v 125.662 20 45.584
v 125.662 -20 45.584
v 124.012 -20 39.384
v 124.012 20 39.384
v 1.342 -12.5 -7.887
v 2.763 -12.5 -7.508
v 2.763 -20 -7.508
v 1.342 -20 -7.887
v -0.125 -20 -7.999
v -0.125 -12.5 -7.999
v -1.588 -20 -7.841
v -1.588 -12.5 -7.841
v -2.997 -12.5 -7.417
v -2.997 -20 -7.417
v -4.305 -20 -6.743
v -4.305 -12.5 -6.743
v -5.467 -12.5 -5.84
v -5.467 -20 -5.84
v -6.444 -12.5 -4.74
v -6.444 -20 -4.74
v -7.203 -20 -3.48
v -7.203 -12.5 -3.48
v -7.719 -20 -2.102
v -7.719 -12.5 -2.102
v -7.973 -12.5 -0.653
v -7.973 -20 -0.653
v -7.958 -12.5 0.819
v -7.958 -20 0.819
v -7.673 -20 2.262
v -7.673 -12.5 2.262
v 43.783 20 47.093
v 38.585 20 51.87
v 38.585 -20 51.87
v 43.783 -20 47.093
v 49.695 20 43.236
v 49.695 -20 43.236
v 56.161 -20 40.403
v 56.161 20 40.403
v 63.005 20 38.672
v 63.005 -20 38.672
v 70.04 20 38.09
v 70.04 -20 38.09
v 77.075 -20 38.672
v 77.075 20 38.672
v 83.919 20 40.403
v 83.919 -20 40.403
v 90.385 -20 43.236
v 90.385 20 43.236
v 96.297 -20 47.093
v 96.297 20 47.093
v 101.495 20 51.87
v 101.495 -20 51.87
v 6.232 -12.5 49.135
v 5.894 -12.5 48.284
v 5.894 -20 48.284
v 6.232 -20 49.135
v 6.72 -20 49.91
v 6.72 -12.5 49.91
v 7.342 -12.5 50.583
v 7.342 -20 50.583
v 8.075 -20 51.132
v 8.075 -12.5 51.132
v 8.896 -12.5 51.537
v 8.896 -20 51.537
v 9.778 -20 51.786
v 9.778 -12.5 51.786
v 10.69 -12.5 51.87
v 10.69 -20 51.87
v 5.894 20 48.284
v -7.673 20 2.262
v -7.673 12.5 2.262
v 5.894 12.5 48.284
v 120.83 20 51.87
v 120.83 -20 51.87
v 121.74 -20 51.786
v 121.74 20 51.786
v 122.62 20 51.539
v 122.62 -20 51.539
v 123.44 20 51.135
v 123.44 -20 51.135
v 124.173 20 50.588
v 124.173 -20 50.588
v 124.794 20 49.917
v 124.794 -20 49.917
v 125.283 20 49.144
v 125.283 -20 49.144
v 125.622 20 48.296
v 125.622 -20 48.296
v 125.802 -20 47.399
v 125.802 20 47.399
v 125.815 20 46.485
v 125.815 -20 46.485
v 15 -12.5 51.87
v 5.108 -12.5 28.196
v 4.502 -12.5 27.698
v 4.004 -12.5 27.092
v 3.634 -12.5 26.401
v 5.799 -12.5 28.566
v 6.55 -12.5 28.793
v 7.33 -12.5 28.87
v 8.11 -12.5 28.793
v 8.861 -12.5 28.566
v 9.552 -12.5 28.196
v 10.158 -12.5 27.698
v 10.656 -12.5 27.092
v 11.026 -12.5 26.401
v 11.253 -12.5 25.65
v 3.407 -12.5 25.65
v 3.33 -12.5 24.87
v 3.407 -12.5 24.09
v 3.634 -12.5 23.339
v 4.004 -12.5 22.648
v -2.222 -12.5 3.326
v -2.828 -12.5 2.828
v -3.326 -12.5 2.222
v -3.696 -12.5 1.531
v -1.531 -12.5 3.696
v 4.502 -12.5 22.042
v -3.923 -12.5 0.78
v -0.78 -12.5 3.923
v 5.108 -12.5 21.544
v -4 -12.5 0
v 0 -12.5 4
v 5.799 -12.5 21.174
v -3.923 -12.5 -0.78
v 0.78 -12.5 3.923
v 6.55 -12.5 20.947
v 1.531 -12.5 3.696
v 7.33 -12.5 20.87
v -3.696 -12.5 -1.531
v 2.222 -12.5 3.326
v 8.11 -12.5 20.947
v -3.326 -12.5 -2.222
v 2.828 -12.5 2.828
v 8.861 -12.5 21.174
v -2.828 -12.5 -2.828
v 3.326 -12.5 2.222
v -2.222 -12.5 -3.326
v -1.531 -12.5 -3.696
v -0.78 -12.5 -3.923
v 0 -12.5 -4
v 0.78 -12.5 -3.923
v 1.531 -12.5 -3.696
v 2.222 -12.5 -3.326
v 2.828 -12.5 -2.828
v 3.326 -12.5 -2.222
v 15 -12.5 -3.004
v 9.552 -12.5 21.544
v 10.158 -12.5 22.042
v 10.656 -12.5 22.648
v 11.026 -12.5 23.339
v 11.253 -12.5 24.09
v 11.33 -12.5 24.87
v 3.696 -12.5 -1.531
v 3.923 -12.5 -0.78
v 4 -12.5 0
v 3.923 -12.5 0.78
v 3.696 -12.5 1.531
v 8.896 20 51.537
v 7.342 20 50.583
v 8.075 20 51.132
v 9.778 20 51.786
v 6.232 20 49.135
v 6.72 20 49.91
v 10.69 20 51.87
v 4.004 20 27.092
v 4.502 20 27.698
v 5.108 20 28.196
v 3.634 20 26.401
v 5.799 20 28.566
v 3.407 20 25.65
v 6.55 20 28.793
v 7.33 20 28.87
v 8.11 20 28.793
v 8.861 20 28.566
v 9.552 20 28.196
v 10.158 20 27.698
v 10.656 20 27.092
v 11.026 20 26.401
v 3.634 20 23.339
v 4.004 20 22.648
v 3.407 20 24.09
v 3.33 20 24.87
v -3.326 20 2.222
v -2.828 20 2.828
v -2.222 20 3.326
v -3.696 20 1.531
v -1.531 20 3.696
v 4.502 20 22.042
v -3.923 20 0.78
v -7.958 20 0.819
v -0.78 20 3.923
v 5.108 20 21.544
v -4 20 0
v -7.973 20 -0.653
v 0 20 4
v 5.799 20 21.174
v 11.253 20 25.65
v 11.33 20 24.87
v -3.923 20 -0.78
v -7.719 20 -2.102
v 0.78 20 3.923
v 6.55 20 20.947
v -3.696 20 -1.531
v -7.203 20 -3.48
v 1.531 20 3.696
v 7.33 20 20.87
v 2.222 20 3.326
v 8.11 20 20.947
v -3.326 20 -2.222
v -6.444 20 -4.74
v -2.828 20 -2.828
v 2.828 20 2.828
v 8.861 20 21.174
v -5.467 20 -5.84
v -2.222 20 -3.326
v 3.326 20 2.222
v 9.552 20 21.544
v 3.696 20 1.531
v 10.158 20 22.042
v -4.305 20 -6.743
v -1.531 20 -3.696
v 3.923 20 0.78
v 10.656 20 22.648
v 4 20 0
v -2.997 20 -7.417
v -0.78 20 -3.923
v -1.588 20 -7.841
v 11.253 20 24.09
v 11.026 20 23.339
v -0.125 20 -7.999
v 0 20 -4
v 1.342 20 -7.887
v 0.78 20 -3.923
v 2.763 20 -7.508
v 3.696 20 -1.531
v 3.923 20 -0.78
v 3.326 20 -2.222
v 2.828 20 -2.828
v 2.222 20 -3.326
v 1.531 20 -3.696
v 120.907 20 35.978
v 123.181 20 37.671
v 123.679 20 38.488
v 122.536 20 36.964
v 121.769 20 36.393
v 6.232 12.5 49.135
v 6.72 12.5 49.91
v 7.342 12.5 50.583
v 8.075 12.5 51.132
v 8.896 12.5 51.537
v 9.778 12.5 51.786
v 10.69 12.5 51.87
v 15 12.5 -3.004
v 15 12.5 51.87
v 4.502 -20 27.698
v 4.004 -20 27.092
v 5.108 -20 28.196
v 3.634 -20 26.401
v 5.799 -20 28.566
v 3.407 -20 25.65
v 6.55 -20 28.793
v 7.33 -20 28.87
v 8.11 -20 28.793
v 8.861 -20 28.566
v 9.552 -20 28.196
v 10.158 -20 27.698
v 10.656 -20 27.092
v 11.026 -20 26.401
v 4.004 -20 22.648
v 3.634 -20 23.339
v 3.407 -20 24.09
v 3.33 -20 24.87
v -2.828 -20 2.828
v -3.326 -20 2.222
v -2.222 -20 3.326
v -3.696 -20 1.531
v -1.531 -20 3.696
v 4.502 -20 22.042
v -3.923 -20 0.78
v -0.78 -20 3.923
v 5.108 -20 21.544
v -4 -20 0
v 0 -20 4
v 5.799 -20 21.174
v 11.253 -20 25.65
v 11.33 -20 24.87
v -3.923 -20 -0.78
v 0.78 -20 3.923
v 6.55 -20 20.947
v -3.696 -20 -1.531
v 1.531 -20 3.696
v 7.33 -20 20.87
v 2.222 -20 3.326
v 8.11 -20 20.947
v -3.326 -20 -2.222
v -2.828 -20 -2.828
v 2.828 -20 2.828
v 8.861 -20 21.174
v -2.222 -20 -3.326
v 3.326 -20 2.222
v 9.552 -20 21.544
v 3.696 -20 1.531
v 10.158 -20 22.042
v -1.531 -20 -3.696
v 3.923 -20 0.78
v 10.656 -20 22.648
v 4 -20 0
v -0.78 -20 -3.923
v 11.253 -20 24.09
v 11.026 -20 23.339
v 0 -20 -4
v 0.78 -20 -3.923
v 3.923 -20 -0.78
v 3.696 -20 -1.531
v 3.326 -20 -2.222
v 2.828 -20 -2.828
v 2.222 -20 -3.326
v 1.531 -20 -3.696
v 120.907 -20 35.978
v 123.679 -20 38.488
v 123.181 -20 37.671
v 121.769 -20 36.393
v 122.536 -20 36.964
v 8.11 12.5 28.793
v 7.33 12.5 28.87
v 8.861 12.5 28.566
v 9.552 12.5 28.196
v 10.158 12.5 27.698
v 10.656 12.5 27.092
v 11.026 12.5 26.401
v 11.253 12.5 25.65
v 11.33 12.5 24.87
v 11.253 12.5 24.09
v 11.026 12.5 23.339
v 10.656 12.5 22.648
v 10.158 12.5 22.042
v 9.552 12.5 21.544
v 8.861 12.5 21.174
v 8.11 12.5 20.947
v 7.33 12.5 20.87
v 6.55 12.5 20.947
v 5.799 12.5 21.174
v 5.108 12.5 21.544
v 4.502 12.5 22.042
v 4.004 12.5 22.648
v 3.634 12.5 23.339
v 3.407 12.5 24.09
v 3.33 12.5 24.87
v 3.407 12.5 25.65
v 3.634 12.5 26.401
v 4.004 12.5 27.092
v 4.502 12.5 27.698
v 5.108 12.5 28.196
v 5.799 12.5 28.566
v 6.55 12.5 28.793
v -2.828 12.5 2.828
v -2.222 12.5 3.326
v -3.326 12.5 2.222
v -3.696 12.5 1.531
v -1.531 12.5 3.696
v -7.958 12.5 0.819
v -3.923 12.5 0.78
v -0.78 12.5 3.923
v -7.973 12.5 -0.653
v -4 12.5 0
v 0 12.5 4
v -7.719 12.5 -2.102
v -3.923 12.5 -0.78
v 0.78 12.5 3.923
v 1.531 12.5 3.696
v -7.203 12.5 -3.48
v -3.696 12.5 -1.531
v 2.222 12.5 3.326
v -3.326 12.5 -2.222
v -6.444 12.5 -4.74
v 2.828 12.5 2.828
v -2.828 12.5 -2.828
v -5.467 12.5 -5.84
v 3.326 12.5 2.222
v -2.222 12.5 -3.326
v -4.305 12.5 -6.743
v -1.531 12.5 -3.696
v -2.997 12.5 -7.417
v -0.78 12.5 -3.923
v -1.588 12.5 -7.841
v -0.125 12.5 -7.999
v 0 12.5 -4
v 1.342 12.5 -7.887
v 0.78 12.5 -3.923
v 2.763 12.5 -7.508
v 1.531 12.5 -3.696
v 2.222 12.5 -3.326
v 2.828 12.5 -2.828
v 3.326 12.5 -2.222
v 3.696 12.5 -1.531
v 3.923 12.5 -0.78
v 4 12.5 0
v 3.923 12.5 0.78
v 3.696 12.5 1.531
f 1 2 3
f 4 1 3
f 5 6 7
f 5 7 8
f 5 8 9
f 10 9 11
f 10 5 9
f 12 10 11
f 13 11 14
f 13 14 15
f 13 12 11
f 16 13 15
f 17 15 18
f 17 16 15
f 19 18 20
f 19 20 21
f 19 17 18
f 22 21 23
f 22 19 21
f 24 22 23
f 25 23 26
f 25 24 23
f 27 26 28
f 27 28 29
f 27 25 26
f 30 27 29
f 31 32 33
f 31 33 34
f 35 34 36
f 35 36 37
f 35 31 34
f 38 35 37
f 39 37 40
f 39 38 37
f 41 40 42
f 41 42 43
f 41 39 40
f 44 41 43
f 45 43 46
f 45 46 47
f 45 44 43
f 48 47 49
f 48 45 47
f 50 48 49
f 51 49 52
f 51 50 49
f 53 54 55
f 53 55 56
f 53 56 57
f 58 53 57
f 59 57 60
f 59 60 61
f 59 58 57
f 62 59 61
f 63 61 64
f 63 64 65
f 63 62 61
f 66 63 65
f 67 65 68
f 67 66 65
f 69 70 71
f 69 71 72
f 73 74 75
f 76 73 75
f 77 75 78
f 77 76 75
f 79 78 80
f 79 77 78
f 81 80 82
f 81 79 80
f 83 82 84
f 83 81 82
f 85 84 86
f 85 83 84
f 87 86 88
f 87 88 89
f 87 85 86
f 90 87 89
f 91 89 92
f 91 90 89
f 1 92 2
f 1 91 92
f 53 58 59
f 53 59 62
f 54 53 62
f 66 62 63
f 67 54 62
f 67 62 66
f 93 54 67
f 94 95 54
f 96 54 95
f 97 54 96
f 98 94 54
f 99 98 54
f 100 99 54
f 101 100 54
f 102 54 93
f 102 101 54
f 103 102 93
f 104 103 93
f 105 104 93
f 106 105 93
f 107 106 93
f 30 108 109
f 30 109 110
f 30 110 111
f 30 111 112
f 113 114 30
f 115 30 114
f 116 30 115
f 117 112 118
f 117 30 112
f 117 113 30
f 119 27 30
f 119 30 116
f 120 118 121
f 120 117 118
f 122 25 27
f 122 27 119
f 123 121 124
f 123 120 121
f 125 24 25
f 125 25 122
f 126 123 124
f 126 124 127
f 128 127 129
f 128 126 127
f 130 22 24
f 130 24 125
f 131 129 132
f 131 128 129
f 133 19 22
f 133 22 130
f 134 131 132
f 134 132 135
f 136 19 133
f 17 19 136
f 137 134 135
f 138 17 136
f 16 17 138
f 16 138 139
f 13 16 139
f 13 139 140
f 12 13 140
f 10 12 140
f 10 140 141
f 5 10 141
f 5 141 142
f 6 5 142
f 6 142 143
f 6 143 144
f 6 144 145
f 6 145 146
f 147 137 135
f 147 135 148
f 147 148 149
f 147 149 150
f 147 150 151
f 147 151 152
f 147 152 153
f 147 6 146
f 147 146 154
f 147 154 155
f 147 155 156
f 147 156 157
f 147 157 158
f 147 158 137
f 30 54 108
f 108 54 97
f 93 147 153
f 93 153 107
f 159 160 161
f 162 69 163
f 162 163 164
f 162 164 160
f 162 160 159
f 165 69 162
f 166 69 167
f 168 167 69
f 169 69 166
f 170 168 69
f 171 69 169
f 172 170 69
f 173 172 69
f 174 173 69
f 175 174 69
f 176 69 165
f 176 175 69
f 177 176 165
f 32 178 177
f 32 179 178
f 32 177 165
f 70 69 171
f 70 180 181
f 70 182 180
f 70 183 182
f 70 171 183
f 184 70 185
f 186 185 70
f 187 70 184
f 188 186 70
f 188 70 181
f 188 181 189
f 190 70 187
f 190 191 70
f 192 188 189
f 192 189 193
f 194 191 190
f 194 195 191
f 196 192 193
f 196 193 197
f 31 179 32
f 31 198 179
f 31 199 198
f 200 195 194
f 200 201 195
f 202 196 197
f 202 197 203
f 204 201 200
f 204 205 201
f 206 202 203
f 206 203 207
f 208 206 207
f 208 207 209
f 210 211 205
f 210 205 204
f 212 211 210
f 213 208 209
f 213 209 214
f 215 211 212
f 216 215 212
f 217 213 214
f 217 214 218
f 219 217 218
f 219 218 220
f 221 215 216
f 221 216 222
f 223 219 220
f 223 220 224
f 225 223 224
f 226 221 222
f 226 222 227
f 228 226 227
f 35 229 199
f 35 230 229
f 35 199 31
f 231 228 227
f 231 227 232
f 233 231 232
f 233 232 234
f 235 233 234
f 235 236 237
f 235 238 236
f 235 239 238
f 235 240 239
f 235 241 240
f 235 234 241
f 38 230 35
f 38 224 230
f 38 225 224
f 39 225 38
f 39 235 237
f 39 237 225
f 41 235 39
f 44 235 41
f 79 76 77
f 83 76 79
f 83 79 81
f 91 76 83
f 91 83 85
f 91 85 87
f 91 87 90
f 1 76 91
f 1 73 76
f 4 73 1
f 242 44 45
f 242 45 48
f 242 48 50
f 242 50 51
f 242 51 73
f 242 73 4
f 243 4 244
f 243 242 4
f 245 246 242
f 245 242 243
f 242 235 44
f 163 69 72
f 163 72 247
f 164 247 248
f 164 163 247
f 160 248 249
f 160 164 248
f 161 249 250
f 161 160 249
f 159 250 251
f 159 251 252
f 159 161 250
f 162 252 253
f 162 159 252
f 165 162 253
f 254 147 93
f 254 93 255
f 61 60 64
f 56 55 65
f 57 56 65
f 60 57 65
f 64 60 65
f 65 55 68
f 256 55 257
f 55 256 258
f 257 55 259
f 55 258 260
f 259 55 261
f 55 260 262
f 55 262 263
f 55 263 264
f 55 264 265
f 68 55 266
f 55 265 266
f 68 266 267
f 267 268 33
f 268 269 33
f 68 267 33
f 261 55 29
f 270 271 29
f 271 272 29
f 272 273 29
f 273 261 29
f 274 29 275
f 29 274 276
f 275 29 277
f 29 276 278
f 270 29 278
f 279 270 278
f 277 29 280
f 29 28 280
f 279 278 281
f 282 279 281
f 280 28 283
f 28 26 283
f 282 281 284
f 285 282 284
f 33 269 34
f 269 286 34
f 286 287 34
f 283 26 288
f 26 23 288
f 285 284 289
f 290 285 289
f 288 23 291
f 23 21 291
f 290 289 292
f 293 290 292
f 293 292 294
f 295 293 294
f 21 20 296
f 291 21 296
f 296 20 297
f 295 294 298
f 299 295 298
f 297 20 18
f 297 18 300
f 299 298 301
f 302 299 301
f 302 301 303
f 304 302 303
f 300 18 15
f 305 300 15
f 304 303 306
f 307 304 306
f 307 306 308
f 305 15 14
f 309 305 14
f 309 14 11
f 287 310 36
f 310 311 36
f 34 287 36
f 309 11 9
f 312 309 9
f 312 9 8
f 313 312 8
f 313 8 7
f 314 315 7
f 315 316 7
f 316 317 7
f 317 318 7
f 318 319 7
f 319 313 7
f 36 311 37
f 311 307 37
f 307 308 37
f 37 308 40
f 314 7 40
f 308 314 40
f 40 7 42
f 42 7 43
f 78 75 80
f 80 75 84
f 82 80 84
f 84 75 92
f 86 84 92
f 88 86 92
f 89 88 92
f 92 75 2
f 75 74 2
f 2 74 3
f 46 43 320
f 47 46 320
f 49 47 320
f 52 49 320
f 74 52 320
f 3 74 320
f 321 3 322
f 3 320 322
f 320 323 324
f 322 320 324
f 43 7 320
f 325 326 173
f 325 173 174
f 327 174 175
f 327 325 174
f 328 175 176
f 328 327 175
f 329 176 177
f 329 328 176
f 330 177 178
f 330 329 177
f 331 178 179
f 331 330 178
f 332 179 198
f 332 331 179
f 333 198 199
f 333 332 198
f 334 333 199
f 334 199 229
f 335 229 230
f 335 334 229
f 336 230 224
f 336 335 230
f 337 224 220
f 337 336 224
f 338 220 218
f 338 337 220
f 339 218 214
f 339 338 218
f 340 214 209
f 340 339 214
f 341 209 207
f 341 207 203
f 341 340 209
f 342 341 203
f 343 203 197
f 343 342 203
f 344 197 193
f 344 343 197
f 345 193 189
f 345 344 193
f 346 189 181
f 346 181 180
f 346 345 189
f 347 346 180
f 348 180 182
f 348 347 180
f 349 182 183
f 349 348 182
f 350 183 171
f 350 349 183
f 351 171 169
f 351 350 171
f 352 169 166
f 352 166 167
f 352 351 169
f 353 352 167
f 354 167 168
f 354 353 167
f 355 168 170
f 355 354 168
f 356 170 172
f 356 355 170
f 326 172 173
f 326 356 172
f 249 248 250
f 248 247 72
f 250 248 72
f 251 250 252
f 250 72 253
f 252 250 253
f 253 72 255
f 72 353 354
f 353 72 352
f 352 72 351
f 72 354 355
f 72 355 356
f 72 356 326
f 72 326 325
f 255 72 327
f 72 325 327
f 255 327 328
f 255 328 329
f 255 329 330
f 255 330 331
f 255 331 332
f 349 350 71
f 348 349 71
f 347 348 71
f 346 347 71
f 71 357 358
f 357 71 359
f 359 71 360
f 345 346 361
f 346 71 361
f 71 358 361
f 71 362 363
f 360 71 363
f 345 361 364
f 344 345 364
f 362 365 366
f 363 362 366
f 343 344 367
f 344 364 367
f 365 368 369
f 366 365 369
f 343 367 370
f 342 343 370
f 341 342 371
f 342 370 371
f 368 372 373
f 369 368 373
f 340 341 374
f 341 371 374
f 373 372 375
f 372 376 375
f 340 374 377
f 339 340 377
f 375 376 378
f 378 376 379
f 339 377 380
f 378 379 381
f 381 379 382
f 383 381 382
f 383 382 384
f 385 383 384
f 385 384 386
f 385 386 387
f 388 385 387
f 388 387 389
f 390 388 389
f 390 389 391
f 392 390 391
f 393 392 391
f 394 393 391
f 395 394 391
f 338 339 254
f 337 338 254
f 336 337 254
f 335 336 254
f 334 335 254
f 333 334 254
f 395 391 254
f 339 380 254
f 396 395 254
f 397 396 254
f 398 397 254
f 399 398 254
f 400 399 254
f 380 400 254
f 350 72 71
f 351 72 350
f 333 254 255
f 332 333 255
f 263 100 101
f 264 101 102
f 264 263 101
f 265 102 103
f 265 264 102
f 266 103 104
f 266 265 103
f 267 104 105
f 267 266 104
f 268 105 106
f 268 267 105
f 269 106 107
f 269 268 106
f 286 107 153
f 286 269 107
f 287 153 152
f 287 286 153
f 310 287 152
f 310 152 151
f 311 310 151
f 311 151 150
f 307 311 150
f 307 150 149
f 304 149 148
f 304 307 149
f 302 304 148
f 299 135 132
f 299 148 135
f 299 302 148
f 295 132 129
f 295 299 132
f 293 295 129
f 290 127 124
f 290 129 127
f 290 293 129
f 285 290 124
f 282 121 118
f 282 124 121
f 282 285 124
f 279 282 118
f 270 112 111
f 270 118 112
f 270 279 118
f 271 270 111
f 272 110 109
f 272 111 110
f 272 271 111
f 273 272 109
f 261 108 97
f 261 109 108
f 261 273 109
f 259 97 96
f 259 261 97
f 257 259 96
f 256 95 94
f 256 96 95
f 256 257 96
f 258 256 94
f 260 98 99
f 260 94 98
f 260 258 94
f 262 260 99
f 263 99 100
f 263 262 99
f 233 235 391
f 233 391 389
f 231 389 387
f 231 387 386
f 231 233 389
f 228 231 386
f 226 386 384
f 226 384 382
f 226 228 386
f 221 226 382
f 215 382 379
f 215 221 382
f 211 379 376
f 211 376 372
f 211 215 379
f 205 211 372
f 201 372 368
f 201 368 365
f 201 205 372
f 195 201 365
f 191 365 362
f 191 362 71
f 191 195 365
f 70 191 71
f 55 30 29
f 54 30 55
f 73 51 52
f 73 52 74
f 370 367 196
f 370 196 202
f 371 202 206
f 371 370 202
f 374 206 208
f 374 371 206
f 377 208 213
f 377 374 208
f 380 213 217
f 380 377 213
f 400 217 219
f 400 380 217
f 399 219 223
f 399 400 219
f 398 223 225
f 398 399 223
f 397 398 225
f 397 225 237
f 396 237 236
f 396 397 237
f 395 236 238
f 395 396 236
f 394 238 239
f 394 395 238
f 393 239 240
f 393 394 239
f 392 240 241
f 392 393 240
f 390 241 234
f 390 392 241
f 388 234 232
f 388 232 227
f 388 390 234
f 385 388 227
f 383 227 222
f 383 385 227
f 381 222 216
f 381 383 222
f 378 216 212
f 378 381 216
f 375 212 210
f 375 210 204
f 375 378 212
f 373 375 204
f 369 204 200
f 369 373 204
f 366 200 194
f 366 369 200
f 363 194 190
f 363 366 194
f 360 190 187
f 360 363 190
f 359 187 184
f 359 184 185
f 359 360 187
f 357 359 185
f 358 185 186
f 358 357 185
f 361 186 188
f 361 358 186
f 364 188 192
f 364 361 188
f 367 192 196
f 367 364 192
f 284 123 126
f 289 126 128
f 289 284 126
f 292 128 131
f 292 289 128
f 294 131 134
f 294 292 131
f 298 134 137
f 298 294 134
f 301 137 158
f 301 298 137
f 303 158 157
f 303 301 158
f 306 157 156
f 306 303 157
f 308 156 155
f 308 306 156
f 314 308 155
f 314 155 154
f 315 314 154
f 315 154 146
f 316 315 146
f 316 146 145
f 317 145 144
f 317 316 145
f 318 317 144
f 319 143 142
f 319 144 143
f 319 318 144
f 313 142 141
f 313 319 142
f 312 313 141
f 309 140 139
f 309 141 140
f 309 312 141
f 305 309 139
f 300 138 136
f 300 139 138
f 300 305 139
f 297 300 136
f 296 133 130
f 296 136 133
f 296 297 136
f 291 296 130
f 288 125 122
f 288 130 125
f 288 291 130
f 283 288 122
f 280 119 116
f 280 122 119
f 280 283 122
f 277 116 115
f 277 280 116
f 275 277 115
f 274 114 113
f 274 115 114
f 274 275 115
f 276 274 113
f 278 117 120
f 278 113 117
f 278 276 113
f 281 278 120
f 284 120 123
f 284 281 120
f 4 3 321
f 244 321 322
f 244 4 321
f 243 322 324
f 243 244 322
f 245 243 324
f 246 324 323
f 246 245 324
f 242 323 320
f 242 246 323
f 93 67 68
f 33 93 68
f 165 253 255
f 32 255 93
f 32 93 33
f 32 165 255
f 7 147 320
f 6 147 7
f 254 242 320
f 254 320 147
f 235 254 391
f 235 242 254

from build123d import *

# Parameters (mm, degrees)
SKETCH_1_R               = 4
EXTRUDE_1_DEPTH          = 20
CUT_EXTRUDE_1_DEPTH      = 138.563388298
CUT_EXTRUDE_1_DEPTH_BACK = 138.563388298
SKETCH_2_W               = 23
SKETCH_2_H               = 25


with BuildPart() as part:
    # 草图1 → 凸台-拉伸1 (new, symmetric)
    with BuildSketch(Plane(origin=(0, 0, 0), x_dir=(1, 0, 0), z_dir=(0, 1, 0))):
        with BuildLine():
            Line((-7.673488412, -2.262205913), (5.894069743, -48.283878695))
            ThreePointArc((5.894069743, -48.283878695), (7.695788374, -50.874334744), (10.69, -51.87))
            Line((10.69, -51.87), (38.585207042, -51.87))
            ThreePointArc((38.585207042, -51.87), (70.04, -38.09), (101.494792958, -51.87))
            Line((101.494792958, -51.87), (120.83, -51.87))
            ThreePointArc((120.83, -51.87), (124.79417955, -49.917175823), (125.661820833, -45.584112198))
            Line((125.661820833, -45.584112198), (124.011820833, -39.384112198))
            ThreePointArc((124.011820833, -39.384112198), (122.875351803, -37.301858813), (120.907082582, -35.97775259))
            Line((120.907082582, -35.97775259), (2.763332132, 7.507595856))
            ThreePointArc((2.763332132, 7.507595856), (-5.467144165, 5.840405352), (-7.673488412, -2.262205913))
        make_face()
        with Locations(Location((0, 0, 0), (0, 0, 270))):
            Circle(SKETCH_1_R, mode=Mode.SUBTRACT)
        with Locations(Location((7.33, -24.87, 0), (0, 0, 270))):
            Circle(SKETCH_1_R, mode=Mode.SUBTRACT)
    extrude(amount=EXTRUDE_1_DEPTH, both=True)

    # 草图2 → 切除-拉伸1 (cut, two sides: drawn at the far end of the back side and taken through both)
    with BuildSketch(Plane.XY.offset(-CUT_EXTRUDE_1_DEPTH_BACK)):
        with Locations((3.5, 0)):
            Rectangle(SKETCH_2_W, SKETCH_2_H)
    extrude(amount=CUT_EXTRUDE_1_DEPTH + CUT_EXTRUDE_1_DEPTH_BACK, mode=Mode.SUBTRACT)


solid = part.part
